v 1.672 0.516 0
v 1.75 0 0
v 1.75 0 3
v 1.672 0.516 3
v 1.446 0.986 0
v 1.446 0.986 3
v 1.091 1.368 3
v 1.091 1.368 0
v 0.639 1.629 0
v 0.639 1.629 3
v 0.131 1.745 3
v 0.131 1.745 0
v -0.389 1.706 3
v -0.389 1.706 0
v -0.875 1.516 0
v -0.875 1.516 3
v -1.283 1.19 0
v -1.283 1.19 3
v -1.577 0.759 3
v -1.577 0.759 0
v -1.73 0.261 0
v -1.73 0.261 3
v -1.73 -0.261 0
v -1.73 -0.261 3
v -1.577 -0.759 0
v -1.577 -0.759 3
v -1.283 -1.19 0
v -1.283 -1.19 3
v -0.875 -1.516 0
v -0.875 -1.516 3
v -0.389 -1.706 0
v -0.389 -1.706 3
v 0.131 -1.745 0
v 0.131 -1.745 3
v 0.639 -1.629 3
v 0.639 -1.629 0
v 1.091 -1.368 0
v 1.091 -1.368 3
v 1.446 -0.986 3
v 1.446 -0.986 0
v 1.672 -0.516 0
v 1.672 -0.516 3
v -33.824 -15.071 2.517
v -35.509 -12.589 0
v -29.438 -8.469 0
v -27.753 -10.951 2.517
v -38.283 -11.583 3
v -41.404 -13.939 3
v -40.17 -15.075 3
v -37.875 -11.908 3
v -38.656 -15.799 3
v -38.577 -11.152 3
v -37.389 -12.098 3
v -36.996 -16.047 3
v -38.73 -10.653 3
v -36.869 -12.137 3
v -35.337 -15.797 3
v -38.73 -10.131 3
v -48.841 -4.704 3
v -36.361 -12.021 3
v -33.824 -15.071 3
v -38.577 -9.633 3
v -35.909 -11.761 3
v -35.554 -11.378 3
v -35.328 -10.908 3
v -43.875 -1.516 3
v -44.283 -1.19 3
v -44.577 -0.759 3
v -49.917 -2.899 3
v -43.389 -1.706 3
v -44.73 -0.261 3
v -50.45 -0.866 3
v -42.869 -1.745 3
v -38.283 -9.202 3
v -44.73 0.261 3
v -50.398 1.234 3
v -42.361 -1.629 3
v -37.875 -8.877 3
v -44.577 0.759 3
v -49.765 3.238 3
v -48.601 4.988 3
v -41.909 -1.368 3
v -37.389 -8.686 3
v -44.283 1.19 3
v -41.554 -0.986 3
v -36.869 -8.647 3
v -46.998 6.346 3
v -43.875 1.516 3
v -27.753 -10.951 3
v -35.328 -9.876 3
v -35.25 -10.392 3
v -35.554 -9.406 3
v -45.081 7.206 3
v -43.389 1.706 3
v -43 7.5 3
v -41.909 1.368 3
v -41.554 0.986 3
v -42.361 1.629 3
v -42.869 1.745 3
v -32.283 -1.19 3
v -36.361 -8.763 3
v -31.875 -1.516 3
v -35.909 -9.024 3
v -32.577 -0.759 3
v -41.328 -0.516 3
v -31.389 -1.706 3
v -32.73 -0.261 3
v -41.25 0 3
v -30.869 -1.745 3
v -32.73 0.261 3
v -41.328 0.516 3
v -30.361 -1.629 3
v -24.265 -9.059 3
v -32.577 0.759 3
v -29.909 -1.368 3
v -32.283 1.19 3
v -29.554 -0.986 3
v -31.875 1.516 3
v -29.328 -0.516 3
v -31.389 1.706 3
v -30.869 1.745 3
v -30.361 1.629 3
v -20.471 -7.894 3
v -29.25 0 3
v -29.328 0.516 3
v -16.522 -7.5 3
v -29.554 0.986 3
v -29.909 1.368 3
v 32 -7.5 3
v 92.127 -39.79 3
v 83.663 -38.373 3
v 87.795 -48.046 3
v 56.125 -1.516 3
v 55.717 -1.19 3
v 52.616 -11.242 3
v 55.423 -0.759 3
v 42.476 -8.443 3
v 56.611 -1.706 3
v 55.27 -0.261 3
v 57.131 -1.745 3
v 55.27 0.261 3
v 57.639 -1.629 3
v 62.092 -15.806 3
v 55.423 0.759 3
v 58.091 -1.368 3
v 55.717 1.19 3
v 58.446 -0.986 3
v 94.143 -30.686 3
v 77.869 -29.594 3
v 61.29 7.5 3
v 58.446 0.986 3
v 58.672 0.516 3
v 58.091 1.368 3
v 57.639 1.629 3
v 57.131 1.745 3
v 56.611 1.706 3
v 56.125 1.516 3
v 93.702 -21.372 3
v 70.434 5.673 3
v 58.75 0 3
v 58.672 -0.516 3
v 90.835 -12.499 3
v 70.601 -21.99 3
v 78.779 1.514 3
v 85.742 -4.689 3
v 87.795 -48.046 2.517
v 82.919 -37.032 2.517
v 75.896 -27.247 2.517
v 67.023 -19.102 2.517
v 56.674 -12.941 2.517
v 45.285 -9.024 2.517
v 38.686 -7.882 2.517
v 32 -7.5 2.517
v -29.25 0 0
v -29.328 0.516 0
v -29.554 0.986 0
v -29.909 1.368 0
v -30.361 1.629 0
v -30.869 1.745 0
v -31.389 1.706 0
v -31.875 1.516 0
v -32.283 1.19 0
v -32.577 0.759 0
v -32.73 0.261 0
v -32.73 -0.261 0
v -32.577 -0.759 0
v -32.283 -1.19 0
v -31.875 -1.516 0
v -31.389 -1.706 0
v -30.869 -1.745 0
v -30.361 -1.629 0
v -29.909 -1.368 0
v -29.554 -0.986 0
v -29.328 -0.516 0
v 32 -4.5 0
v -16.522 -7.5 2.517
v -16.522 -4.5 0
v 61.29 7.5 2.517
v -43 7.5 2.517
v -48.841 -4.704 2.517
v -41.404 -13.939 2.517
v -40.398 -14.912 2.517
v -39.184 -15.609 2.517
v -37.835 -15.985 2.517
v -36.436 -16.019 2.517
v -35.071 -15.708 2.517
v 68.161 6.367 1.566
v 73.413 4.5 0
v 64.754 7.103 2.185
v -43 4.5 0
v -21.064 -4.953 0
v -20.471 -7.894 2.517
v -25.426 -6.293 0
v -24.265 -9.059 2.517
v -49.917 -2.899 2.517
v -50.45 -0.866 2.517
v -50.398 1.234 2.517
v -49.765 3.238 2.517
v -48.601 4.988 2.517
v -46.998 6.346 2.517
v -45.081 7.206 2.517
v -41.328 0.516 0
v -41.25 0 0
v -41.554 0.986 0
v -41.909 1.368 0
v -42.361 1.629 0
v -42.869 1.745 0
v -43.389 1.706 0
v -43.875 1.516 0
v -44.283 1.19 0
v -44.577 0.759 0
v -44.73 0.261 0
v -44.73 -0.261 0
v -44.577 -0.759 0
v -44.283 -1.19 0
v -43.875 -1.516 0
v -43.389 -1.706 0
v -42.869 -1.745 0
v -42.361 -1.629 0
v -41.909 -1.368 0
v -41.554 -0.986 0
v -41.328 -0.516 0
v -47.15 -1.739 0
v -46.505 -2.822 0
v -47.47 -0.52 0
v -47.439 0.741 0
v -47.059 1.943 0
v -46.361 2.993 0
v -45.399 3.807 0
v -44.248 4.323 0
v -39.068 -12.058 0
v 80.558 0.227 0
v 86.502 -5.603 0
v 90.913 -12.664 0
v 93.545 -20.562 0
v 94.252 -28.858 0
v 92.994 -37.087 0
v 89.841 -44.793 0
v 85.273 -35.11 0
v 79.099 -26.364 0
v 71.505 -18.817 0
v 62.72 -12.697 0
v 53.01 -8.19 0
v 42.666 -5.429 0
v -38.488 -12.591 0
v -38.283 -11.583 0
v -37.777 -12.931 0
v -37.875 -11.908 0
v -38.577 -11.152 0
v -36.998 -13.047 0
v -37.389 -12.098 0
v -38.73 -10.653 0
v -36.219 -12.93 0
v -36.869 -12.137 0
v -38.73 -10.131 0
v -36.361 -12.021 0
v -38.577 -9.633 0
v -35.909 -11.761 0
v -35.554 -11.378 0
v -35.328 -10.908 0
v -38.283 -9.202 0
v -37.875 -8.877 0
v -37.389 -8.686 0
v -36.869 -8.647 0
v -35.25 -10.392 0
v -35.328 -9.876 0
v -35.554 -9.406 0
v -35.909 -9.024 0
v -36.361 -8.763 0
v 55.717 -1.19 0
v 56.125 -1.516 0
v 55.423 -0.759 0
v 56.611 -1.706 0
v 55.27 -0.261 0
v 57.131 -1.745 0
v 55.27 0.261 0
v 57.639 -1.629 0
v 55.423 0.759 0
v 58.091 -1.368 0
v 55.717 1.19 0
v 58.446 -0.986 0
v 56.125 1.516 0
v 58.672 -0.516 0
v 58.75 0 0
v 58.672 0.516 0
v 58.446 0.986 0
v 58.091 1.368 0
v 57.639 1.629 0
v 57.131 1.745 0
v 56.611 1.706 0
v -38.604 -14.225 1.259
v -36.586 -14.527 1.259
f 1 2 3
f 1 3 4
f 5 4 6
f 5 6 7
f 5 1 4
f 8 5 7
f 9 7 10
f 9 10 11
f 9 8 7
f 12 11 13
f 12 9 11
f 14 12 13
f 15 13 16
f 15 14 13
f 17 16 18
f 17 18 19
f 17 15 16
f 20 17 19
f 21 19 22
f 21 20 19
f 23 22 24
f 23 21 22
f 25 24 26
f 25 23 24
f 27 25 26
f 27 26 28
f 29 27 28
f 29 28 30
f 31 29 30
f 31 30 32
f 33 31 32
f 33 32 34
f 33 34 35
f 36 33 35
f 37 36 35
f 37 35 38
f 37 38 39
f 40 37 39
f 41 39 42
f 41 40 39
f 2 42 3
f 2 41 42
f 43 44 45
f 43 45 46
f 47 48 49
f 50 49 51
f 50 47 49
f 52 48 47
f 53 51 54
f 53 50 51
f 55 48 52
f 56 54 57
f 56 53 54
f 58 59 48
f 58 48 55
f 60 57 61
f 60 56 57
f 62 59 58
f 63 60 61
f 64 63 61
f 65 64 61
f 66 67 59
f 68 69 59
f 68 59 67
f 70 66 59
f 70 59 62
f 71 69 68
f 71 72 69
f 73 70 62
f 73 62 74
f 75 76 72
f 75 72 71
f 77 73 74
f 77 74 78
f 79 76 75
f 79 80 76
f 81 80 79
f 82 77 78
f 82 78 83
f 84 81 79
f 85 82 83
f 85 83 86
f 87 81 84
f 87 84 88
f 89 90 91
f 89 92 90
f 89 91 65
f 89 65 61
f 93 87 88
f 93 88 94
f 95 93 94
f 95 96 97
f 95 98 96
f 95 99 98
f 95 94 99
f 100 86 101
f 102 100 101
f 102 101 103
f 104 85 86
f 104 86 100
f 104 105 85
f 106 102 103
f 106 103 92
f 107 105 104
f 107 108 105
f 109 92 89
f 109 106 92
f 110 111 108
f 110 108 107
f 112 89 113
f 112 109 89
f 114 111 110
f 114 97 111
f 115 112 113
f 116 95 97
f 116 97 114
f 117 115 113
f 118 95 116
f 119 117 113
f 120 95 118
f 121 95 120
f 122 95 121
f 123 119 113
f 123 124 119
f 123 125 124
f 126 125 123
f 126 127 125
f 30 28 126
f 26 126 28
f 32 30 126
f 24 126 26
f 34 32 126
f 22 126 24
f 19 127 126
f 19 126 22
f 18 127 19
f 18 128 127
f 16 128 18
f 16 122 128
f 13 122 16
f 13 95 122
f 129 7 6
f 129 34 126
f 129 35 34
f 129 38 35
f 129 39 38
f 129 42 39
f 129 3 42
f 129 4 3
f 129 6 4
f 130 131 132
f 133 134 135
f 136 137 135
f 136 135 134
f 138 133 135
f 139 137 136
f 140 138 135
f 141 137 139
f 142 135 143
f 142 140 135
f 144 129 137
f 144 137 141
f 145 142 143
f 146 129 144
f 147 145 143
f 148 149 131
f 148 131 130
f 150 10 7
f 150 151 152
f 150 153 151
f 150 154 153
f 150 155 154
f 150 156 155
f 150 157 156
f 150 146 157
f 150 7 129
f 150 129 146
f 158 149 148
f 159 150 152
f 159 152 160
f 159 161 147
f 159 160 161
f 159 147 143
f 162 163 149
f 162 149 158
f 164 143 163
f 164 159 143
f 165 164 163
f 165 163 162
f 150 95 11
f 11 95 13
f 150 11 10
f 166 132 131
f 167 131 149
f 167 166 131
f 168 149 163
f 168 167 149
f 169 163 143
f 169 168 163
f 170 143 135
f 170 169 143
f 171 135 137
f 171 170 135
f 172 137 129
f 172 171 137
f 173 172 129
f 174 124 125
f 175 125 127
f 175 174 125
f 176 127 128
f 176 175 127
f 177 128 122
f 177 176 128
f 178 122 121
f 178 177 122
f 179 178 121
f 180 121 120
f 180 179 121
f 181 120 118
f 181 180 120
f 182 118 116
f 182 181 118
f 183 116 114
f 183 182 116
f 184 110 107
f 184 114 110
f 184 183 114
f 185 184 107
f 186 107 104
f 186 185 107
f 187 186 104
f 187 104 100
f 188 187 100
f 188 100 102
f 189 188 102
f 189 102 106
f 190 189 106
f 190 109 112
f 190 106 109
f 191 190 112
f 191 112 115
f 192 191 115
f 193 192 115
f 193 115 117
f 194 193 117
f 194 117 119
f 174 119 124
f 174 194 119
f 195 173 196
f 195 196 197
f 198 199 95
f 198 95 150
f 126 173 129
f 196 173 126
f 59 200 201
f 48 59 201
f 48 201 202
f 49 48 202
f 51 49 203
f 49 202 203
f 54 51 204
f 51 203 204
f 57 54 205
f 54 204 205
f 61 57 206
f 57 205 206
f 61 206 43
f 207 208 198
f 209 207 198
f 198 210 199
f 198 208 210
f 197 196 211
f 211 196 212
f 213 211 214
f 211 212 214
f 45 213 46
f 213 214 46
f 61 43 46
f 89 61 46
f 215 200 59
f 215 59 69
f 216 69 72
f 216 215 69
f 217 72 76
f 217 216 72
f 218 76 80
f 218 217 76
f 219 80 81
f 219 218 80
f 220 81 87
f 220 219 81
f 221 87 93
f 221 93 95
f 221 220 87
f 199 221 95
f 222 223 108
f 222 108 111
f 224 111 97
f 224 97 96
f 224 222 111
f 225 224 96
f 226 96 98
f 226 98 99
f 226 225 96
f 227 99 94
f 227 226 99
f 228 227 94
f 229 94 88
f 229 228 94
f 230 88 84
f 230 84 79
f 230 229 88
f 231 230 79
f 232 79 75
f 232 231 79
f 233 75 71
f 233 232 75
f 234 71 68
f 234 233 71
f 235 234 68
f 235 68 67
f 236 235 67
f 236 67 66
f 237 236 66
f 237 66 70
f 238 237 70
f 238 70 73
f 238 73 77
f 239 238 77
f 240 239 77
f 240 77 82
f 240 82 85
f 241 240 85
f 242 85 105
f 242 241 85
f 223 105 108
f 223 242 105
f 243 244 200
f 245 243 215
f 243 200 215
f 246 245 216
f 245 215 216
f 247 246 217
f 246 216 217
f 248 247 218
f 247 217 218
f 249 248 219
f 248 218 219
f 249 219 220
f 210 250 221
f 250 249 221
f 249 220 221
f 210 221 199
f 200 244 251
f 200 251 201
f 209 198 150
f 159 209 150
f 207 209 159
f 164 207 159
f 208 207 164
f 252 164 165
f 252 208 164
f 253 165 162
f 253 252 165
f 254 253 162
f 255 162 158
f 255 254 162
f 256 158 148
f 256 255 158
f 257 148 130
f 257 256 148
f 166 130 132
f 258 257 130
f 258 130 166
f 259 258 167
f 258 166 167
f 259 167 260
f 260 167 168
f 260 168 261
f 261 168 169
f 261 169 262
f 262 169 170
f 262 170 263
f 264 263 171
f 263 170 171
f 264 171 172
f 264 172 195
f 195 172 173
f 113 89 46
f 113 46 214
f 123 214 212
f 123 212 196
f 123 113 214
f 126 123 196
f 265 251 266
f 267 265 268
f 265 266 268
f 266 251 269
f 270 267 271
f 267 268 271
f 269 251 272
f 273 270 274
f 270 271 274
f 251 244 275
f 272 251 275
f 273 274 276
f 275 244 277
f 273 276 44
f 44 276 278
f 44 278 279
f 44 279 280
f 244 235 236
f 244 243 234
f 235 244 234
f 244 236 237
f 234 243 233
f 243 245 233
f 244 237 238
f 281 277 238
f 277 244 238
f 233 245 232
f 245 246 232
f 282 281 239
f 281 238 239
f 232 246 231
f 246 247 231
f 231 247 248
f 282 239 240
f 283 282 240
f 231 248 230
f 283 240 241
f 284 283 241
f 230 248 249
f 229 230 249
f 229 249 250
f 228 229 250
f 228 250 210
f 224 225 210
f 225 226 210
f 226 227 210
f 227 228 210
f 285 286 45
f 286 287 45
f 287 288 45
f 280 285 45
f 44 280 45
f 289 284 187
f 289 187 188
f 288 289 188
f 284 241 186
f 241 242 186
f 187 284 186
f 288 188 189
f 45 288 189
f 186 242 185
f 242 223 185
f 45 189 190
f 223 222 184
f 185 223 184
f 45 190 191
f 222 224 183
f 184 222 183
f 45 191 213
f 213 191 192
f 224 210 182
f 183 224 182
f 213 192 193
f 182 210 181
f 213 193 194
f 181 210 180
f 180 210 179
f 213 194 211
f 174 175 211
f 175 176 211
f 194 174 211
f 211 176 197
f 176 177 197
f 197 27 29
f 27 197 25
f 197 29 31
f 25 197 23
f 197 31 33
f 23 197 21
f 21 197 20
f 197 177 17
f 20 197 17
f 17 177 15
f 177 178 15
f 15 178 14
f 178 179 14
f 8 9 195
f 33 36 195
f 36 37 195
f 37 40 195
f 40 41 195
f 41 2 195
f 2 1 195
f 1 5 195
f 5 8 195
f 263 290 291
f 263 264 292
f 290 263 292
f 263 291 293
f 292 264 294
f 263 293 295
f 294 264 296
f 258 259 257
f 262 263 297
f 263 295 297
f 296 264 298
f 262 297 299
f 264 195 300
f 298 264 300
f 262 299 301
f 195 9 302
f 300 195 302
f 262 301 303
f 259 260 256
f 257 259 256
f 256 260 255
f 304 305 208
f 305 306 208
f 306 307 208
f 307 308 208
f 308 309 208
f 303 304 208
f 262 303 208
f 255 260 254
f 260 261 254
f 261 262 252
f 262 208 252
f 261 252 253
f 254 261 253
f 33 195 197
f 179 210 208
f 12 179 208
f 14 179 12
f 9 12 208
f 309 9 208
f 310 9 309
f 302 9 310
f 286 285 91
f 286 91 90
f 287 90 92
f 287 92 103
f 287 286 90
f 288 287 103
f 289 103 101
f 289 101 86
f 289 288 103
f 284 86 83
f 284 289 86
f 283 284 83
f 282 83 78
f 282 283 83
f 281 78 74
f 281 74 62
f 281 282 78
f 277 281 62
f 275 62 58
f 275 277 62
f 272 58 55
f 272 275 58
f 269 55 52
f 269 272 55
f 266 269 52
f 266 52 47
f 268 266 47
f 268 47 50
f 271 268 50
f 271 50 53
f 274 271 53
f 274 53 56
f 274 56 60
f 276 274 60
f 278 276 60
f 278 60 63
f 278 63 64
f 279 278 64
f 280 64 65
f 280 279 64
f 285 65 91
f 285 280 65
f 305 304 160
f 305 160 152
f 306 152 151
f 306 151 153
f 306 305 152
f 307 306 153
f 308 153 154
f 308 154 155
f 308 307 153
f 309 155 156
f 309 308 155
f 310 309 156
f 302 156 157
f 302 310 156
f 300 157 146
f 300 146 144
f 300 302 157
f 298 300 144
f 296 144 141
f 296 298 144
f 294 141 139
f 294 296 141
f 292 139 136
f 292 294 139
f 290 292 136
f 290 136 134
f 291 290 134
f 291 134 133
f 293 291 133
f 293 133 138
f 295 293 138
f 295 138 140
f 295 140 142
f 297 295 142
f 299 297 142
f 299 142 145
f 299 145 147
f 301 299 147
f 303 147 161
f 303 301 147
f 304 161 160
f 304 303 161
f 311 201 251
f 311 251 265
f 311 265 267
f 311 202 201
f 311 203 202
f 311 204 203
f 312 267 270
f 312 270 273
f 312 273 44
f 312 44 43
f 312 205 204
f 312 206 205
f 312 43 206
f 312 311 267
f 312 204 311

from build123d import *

# Parameters (mm, degrees)
IZIM1_R                     = 1.75
Y_KSEKLIK_EKSTR_ZYON1_DEPTH = 3
Y_KSEKLIK_EKSTR_ZYON2_DEPTH = 3
IZIM4_R                     = 1.75
Y_KSEKLIK_EKSTR_ZYON3_DEPTH = 3
RADYUS1_R                   = 20
IZIM4_3_R                   = 1.75
KES_EKSTR_ZYON1_DEPTH       = 10


with BuildPart() as part:
    # Çizim1 → Yükseklik-Ekstrüzyon1 (new body)
    with BuildSketch(Plane.XY):
        with BuildLine():
            Line((-43, 7.5), (57, 7.5))
            ThreePointArc((57, 7.5), (64.5, 0), (57, -7.5))
            Line((57, -7.5), (-43, -7.5))
            ThreePointArc((-43, -7.5), (-50.5, 0), (-43, 7.5))
        make_face()
        Circle(IZIM1_R, mode=Mode.SUBTRACT)
        with Locations((-43, 0)):
            Circle(IZIM1_R, mode=Mode.SUBTRACT)
        with Locations((57, 0)):
            Circle(IZIM1_R, mode=Mode.SUBTRACT)
    extrude(amount=Y_KSEKLIK_EKSTR_ZYON1_DEPTH)

    # Çizim2 → Yükseklik-Ekstrüzyon2 (add)
    with BuildSketch(Plane(origin=(0, 0, 0), x_dir=(-1, 0, 0), z_dir=(0, 0, -1))):
        with BuildLine():
            ThreePointArc((-57, -7.5), (-64.5, 0), (-57, 7.5))
            Line((-57, 7.5), (-61.290238096, 7.5))
            ThreePointArc((-61.290238096, 7.5), (-90.835057362, -12.499091059), (-87.794753659, -48.04647552))
            ThreePointArc((-87.794753659, -48.04647552), (-66.485762327, -18.707163802), (-32, -7.5))
            Line((-32, -7.5), (-57, -7.5))
        make_face()
    extrude(amount=-Y_KSEKLIK_EKSTR_ZYON2_DEPTH)

    # Çizim4 → Yükseklik-Ekstrüzyon3 (add)
    with BuildSketch(Plane.XY):
        with BuildLine():
            Line((-33.824470976, -15.071432033), (-22.668001232, -7.5))
            Line((-22.668001232, -7.5), (-22.668001232, 7.5))
            Line((-22.668001232, 7.5), (-43, 7.5))
            ThreePointArc((-43, 7.5), (-49.765006227, 3.23800722), (-48.841370401, -4.704082465))
            Line((-48.841370401, -4.704082465), (-41.404337559, -13.93913815))
            ThreePointArc((-41.404337559, -13.93913815), (-37.835472898, -15.985175384), (-33.824470976, -15.071432033))
        make_face()
        with Locations((-37, -10.392304845)):
            Circle(IZIM4_R, mode=Mode.SUBTRACT)
        with Locations((-43, 0)):
            Circle(IZIM4_R, mode=Mode.SUBTRACT)
        with Locations((-31, 0)):
            Circle(IZIM4_R, mode=Mode.SUBTRACT)
    extrude(amount=Y_KSEKLIK_EKSTR_ZYON3_DEPTH)

    # Radyus1
    radyus1_edges = [part.edges().sort_by_distance(p)[0] for p in [
        (-22.668001232, -7.5, 1.5),
    ]]
    fillet(radyus1_edges, radius=RADYUS1_R)

    # Çizim4<3> → Kes-Ekstrüzyon1 (cut)
    with BuildSketch(Plane.XY):
        with Locations((-31, 0)):
            Circle(IZIM4_3_R)
    extrude(amount=KES_EKSTR_ZYON1_DEPTH, mode=Mode.SUBTRACT)

    # Pah2
    # the kernel refuses this chamfer: 3, 2.517298894 mm, written as the material it takes off along each edge
    with BuildSketch(Plane(origin=(32, -66.161957074, 0), x_dir=(0.9999969206836817, -0.0024816573402179206, 0), z_dir=(-0.0024816573402179206, -0.9999969206836817, 0))) as pah2_piece_1:
        with BuildLine():
            Line((61.753882408, -0.077134513), (58.570031741, 2.594433407))
            Line((58.570031741, 2.594433407), (58.510031741, 2.594433407))
            ThreePointArc((58.510031741, 2.594433407), (58.601957074, 1.297216703), (58.601957074, 0))
            Line((58.601957074, 0), (58.661957074, -0.06))
            ThreePointArc((58.661957074, -0.06), (60.207919741, -0.06), (61.753882408, -0.137134513))
            Line((61.753882408, -0.137134513), (61.753882408, -0.077134513))
        make_face()
    revolve(axis=Axis((32, -66.161957074, 0), (0, 0, 1)), revolution_arc=90.142188638, mode=Mode.SUBTRACT)
    with BuildSketch(Plane(origin=(-43, 7.5, 0), x_dir=(0, -0.9996889667359941, -0.024939322090234348), z_dir=(1, 0, 0))) as pah2_piece_2:
        with BuildLine():
            Line((3.092887324, 0), (-0.156600152, -2.591333896))
            Line((-0.156600152, -2.591333896), (-0.21658149, -2.589837537))
            ThreePointArc((-0.21658149, -2.589837537), (-0.092333043, -1.295316866), (-0.059981338, 0.001496359))
            Line((-0.059981338, 0.001496359), (0.001496359, 0.059981338))
            ThreePointArc((0.001496359, 0.059981338), (1.54697818, 0.021426077), (3.094383683, 0.059981338))
            Line((3.094383683, 0.059981338), (3.092887324, 0))
        make_face()
    extrude(amount=122.84756204, mode=Mode.SUBTRACT)
    with BuildSketch(Plane(origin=(-48.841370401, -4.704082465, 0), x_dir=(0.7786071387098311, 0.6270159118904154, -0.024939322090234337), z_dir=(0.6272109953735269, -0.7788493867767694, 0))) as pah2_piece_3:
        with BuildLine():
            Line((3.092887324, 0), (-0.156600152, 2.591333896))
            Line((-0.156600152, 2.591333896), (-0.21658149, 2.589837537))
            ThreePointArc((-0.21658149, 2.589837537), (-0.092333043, 1.295316866), (-0.059981338, -0.001496359))
            Line((-0.059981338, -0.001496359), (0.001496359, -0.059981338))
            ThreePointArc((0.001496359, -0.059981338), (1.54697818, -0.021426077), (3.094383683, -0.059981338))
            Line((3.094383683, -0.059981338), (3.092887324, 0))
        make_face()
    extrude(amount=11.857306228, mode=Mode.SUBTRACT)
    with BuildSketch(Plane(origin=(-37, -10.392304845, 0), x_dir=(-0.7788493867767683, -0.6272109953735282, 0), z_dir=(-0.6272109953735282, 0.7788493867767683, 0))) as pah2_piece_4:
        with BuildLine():
            Line((2.563003121, -0.077134513), (5.746853788, 2.594433407))
            Line((5.746853788, 2.594433407), (5.806853788, 2.594433407))
            ThreePointArc((5.806853788, 2.594433407), (5.714928454, 1.297216703), (5.714928454, 0))
            Line((5.714928454, 0), (5.654928454, -0.06))
            ThreePointArc((5.654928454, -0.06), (4.108965788, -0.06), (2.563003121, -0.137134513))
            Line((2.563003121, -0.137134513), (2.563003121, -0.077134513))
        make_face()
    revolve(axis=Axis((-37, -10.392304845, 0), (0, 0, 1)), revolution_arc=85.318453593, mode=Mode.SUBTRACT)
    with BuildSketch(Plane(origin=(-33.824470976, -15.071432033, 0), x_dir=(-0.5613760376690521, 0.8271849699702446, -0.024939322090234337), z_dir=(0.8274423320595619, 0.5615506986157474, 0))) as pah2_piece_5:
        with BuildLine():
            Line((3.092887324, 0), (-0.156600152, 2.591333896))
            Line((-0.156600152, 2.591333896), (-0.21658149, 2.589837537))
            ThreePointArc((-0.21658149, 2.589837537), (-0.092333043, 1.295316866), (-0.059981338, -0.001496359))
            Line((-0.059981338, -0.001496359), (0.001496359, -0.059981338))
            ThreePointArc((0.001496359, -0.059981338), (1.54697818, -0.021426077), (3.094383683, -0.059981338))
            Line((3.094383683, -0.059981338), (3.092887324, 0))
        make_face()
    extrude(amount=7.337322676, mode=Mode.SUBTRACT)
    with BuildSketch(Plane(origin=(-43, 0, 0), x_dir=(-0.7788493867767701, -0.6272109953735259, 0), z_dir=(0.6272109953735259, -0.7788493867767701, 0))) as pah2_piece_6:
        with BuildLine():
            Line((4.408074667, 0.077134513), (7.591925333, -2.594433407))
            Line((7.591925333, -2.594433407), (7.651925333, -2.594433407))
            ThreePointArc((7.651925333, -2.594433407), (7.56, -1.297216703), (7.56, 0))
            Line((7.56, 0), (7.5, 0.06))
            ThreePointArc((7.5, 0.06), (5.954037333, 0.06), (4.408074667, 0.137134513))
            Line((4.408074667, 0.137134513), (4.408074667, 0.077134513))
        make_face()
    revolve(axis=Axis((-43, 0, 0), (0, 0, -1)), revolution_arc=128.844653269, mode=Mode.SUBTRACT)
    with BuildSketch(Plane(origin=(32, -7.5, 0), x_dir=(0, -0.035409536913662706, 0.9993728857116145), z_dir=(-1, 0, 0))) as pah2_piece_7:
        with BuildLine():
            Line((2.596061434, 0), (-0.186569785, 3.087255045))
            Line((-0.186569785, 3.087255045), (-0.246532158, 3.085130473))
            ThreePointArc((-0.246532158, 3.085130473), (-0.114704195, 1.542868599), (-0.059962373, -0.002124572))
            Line((-0.059962373, -0.002124572), (0.002124572, -0.059962373))
            ThreePointArc((0.002124572, -0.059962373), (1.298527772, -0.01402853), (2.598186006, -0.059962373))
            Line((2.598186006, -0.059962373), (2.596061434, 0))
        make_face()
    extrude(amount=48.522245618, mode=Mode.SUBTRACT)
    with BuildSketch(Plane(origin=(-16.522245618, -27.5, 0), x_dir=(0, 1, 0), z_dir=(1, 0, 0))) as pah2_piece_8:
        with BuildLine():
            Line((23.091925333, -0.077134513), (19.908074667, 2.594433407))
            Line((19.908074667, 2.594433407), (19.848074667, 2.594433407))
            ThreePointArc((19.848074667, 2.594433407), (19.94, 1.297216703), (19.94, 0))
            Line((19.94, 0), (20, -0.06))
            ThreePointArc((20, -0.06), (21.545962667, -0.06), (23.091925333, -0.137134513))
            Line((23.091925333, -0.137134513), (23.091925333, -0.077134513))
        make_face()
    revolve(axis=Axis((-16.522245618, -27.5, 0), (0, 0, 1)), revolution_arc=34.163106862, mode=Mode.SUBTRACT)


solid = part.part
